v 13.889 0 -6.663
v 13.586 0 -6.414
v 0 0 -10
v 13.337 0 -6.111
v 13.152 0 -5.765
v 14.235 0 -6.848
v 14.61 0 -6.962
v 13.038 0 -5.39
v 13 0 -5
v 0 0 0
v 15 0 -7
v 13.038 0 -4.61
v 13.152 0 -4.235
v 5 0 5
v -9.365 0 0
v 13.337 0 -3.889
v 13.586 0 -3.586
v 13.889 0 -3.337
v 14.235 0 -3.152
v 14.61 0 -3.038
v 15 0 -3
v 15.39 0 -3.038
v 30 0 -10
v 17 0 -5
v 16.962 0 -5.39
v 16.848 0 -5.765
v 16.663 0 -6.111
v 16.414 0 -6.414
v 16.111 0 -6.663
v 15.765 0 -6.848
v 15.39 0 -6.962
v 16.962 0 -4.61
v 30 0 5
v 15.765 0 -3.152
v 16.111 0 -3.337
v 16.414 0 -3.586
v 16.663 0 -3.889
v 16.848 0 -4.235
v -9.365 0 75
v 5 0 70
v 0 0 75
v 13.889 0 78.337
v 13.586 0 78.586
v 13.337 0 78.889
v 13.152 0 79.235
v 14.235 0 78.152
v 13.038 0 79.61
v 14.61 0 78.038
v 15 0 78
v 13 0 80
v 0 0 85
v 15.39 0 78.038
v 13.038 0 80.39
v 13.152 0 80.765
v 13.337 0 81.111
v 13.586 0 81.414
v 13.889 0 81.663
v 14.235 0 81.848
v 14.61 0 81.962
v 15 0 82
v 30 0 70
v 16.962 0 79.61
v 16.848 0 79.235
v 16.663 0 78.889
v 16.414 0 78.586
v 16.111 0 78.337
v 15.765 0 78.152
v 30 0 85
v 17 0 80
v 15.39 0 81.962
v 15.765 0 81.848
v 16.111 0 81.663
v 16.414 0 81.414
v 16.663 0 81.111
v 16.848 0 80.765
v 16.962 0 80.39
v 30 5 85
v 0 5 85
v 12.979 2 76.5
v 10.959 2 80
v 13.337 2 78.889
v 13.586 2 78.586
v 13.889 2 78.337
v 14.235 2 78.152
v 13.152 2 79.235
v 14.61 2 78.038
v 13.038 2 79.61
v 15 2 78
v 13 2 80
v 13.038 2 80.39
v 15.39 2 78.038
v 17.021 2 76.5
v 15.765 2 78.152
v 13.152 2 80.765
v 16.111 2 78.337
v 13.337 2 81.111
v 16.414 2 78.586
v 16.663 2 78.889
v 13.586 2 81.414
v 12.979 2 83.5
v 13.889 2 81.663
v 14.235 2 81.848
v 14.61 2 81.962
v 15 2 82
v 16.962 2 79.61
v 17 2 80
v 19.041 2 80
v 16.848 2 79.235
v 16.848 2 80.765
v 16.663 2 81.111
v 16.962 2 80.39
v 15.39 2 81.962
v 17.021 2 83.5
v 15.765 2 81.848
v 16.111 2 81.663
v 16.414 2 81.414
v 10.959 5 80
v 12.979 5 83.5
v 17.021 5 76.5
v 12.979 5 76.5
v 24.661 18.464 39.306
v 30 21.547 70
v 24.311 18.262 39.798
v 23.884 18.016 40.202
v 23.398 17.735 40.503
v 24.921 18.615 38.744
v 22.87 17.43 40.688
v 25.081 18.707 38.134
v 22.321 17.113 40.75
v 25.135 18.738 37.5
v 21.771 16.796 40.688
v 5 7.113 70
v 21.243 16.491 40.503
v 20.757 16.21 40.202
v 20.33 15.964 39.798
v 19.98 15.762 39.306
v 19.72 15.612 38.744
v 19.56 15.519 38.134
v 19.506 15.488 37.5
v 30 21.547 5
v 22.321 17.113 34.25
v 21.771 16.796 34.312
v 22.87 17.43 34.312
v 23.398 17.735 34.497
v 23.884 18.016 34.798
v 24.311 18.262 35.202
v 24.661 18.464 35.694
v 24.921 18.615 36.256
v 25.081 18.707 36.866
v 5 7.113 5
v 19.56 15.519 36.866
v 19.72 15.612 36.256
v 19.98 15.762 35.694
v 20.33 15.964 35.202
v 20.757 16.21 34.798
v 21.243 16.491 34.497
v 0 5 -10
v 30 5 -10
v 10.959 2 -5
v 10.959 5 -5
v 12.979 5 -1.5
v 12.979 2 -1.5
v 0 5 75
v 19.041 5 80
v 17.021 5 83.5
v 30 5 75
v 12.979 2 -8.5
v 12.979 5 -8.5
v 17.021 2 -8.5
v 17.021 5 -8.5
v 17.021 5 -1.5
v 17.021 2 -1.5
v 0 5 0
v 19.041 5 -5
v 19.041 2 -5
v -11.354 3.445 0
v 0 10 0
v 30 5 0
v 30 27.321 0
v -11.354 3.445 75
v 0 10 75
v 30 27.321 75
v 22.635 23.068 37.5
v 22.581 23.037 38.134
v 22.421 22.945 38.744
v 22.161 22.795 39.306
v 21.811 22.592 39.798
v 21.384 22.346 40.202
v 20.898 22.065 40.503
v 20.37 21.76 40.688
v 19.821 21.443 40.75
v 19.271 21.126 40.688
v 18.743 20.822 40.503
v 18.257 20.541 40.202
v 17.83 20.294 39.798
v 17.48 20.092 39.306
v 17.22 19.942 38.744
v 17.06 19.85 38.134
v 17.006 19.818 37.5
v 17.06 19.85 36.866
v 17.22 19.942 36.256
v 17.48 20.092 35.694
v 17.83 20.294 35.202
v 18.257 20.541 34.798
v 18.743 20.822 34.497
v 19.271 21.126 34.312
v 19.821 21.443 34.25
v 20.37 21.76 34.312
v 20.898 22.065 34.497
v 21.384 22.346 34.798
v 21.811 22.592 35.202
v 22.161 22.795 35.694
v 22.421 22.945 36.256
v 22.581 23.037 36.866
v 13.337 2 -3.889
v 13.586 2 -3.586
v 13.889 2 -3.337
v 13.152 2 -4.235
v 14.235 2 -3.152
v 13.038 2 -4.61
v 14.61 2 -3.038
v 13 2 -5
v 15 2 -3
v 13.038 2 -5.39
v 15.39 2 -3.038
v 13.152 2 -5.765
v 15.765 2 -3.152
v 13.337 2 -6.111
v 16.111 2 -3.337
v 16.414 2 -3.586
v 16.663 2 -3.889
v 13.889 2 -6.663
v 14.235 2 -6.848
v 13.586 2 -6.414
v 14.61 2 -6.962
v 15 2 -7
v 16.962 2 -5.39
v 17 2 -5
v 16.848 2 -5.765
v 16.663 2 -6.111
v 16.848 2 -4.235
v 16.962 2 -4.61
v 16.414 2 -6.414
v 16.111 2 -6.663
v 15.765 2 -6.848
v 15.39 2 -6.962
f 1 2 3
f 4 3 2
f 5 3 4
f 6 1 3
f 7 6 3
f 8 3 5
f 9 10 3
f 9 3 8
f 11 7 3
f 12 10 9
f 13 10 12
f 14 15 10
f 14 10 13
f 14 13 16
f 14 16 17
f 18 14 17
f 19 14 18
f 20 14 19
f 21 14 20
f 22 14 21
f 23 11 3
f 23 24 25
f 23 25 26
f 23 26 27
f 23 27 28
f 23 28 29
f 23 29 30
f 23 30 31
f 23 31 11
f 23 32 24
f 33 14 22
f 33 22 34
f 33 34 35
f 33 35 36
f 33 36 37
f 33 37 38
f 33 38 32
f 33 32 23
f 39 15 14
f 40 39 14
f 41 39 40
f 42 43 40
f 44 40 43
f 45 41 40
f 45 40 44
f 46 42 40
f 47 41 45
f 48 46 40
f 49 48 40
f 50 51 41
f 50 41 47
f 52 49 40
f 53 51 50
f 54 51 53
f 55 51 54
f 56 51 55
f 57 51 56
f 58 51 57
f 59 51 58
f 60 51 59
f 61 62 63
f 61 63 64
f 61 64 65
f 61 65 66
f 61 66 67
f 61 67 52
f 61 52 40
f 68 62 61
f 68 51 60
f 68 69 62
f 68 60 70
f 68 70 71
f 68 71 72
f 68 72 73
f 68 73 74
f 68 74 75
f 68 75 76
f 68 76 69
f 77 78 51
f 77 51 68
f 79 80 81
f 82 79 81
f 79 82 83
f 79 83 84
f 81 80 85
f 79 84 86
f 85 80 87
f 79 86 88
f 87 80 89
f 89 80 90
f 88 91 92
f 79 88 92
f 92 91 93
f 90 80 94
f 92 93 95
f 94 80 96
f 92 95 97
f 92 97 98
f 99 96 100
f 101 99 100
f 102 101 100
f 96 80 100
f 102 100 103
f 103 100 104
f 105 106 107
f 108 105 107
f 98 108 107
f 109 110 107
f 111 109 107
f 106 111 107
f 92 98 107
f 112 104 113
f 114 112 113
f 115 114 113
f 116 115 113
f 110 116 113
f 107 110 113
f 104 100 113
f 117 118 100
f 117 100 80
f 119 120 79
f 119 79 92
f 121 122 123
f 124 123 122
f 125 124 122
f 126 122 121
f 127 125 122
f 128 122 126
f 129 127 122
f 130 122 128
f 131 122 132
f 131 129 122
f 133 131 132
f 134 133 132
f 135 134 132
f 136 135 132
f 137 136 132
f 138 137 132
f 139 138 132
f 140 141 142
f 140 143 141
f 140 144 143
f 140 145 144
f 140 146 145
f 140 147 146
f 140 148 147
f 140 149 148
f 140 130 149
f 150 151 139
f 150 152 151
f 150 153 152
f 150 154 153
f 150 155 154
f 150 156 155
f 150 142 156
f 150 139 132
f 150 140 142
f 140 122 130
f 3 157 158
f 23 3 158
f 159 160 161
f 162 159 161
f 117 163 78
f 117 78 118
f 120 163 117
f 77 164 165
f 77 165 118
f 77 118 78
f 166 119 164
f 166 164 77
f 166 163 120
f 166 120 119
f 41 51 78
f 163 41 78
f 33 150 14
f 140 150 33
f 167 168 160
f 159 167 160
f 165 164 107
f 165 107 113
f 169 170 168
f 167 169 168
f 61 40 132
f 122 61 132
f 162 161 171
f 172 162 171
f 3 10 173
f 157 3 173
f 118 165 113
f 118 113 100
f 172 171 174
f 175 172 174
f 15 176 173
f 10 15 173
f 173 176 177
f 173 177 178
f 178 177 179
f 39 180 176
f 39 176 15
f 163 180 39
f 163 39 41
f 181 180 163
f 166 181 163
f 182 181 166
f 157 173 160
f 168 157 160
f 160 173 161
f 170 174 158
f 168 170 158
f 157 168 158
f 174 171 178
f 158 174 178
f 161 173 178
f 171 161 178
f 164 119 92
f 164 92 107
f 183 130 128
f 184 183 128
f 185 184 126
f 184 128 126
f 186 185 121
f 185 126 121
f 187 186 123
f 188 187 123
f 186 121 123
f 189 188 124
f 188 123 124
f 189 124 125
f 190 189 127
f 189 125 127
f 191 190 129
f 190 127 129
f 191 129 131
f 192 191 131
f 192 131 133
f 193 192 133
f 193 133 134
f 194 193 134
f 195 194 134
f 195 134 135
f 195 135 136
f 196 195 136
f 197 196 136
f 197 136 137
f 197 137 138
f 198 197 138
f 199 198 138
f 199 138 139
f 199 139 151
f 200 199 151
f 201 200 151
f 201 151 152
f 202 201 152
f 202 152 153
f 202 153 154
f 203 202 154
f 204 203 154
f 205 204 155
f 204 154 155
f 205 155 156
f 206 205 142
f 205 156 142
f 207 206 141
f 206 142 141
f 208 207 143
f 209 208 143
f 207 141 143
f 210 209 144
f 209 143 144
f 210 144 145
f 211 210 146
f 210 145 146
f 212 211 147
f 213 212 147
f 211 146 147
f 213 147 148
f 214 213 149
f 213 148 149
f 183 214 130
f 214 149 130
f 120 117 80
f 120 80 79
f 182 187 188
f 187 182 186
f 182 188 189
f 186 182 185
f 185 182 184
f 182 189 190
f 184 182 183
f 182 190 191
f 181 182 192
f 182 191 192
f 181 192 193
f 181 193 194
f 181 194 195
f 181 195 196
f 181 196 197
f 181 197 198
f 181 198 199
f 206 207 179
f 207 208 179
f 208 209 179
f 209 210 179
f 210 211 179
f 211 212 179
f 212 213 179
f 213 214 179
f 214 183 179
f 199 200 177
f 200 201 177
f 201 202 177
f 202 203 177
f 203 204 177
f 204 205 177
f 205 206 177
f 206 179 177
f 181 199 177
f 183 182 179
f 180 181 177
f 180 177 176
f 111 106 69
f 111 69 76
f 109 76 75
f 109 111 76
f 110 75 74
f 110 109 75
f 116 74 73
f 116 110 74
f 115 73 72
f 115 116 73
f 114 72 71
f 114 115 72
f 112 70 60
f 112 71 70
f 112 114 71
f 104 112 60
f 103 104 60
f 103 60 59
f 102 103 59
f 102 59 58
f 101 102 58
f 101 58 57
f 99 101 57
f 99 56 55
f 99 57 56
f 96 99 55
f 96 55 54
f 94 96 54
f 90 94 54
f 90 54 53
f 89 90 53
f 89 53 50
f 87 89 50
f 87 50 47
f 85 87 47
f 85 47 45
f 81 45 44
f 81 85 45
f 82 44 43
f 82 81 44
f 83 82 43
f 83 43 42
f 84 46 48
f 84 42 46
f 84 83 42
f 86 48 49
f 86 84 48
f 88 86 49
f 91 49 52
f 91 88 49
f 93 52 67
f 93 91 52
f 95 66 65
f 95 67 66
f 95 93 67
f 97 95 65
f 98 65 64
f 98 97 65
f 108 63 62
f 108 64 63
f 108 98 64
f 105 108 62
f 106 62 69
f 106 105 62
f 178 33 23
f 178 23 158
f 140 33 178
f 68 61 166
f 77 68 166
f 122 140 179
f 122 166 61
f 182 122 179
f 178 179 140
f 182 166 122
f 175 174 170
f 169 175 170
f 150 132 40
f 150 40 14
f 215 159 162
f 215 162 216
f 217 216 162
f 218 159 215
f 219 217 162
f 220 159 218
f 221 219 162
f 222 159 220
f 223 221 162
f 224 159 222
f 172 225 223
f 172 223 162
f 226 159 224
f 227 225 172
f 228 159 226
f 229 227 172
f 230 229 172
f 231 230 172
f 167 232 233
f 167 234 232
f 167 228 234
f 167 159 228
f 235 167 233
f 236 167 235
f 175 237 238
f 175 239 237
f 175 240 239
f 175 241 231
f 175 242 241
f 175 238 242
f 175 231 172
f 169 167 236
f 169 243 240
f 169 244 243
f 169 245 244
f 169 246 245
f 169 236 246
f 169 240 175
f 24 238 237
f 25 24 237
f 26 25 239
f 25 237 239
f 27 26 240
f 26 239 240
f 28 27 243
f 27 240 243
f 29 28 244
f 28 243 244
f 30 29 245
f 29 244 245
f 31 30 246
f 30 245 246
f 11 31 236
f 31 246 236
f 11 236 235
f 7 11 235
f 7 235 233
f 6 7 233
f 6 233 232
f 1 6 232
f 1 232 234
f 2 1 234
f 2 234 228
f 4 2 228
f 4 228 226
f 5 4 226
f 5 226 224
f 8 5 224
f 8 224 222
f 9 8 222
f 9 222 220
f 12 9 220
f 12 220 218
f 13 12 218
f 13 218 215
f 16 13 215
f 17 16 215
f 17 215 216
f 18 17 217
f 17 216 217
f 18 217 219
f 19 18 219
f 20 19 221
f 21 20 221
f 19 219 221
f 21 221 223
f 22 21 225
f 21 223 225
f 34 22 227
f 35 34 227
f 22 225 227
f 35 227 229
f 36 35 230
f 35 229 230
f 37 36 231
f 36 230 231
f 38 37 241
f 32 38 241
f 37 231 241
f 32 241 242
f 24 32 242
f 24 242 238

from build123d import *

# Parameters (mm, degrees)
EXTRUDE_1_DEPTH     = 75
SHELL_1_T           = -5
SKETCH_2_W          = 65
SKETCH_2_H          = 5
CUT_EXTRUDE_1_DEPTH = 25
SKETCH_3_R          = 3.25
CUT_EXTRUDE_2_DEPTH = 21
SKETCH_4_W          = 30
SKETCH_4_H          = 5
EXTRUDE_2_DEPTH     = 10
EXTRUDE_3_DEPTH     = 75
SKETCH_8_R          = 2
CUT_EXTRUDE_4_DEPTH = 6
CUT_EXTRUDE_5_DEPTH = 3


with BuildPart() as part:
    # 草图1 → 凸台-拉伸1 (new body)
    with BuildSketch(Plane.XY):
        Polygon((0, 0), (30, 0), (30, 27.320508076), (0, 10), align=None)
    extrude(amount=EXTRUDE_1_DEPTH)

    # 抽壳1
    shell_1_openings = [part.faces().sort_by_distance(p)[0] for p in [
        (30, 13.660254038, 37.5),
    ]]
    offset(amount=SHELL_1_T, openings=shell_1_openings, kind=Kind.INTERSECTION)

    # 草图2 → 切除-拉伸1 (cut)
    with BuildSketch(Plane(origin=(30, 0, 0), x_dir=(0, 0, -1), z_dir=(1, 0, 0))):
        with Locations((-37.5, 2.5)):
            Rectangle(SKETCH_2_W, SKETCH_2_H)
    extrude(amount=-CUT_EXTRUDE_1_DEPTH, mode=Mode.SUBTRACT)

    # 草图3 → 切除-拉伸2 (cut, through all)
    with BuildSketch(Plane(origin=(-1.830127019, 3.169872981, 0), x_dir=(0.866025404, 0.5, 0), z_dir=(0.5, -0.866025404, 0))):
        with Locations((27.886751346, 37.5)):
            Circle(SKETCH_3_R)
    extrude(amount=-CUT_EXTRUDE_2_DEPTH, mode=Mode.SUBTRACT)

    # 草图4 → 凸台-拉伸2 (add)
    with BuildSketch(Plane.XY.offset(75)):
        with Locations((15, 2.5)):
            Rectangle(SKETCH_4_W, SKETCH_4_H)
    extrude_2 = extrude(amount=EXTRUDE_2_DEPTH)

    # 镜向1: 凸台-拉伸2 across plane
    add(extrude_2.mirror(Plane.XY.offset(37.5)))

    # 草图5 → 凸台-拉伸3 (add)
    with BuildSketch(Plane.XY.offset(75)):
        Polygon((0, 10), (-11.353593044, 3.445), (-9.364621366, 0), (0, 0), align=None)
    extrude(amount=-EXTRUDE_3_DEPTH)

    # 草图8 → 切除-拉伸4 (cut, through all)
    with BuildSketch(Plane(origin=(0, 5, 0), x_dir=(1, 0, 0), z_dir=(0, 1, 0))):
        with Locations((15, 5)):
            Circle(SKETCH_8_R)
    cut_extrude_4 = extrude(amount=-CUT_EXTRUDE_4_DEPTH, mode=Mode.SUBTRACT)

    # 草图9 → 切除-拉伸5 (cut)
    with BuildSketch(Plane(origin=(0, 5, 0), x_dir=(1, 0, 0), z_dir=(0, 1, 0))):
        Polygon((17.020725942, 8.5), (12.979274058, 8.5), (10.958548116, 5), (12.979274058, 1.5), (17.020725942, 1.5), (19.041451884, 5), align=None)
    cut_extrude_5 = extrude(amount=-CUT_EXTRUDE_5_DEPTH, mode=Mode.SUBTRACT)

    # 镜向2: 切除-拉伸4, 切除-拉伸5 across plane
    add(cut_extrude_4.mirror(Plane.XY.offset(37.5)), mode=Mode.SUBTRACT)
    add(cut_extrude_5.mirror(Plane.XY.offset(37.5)), mode=Mode.SUBTRACT)


solid = part.part
